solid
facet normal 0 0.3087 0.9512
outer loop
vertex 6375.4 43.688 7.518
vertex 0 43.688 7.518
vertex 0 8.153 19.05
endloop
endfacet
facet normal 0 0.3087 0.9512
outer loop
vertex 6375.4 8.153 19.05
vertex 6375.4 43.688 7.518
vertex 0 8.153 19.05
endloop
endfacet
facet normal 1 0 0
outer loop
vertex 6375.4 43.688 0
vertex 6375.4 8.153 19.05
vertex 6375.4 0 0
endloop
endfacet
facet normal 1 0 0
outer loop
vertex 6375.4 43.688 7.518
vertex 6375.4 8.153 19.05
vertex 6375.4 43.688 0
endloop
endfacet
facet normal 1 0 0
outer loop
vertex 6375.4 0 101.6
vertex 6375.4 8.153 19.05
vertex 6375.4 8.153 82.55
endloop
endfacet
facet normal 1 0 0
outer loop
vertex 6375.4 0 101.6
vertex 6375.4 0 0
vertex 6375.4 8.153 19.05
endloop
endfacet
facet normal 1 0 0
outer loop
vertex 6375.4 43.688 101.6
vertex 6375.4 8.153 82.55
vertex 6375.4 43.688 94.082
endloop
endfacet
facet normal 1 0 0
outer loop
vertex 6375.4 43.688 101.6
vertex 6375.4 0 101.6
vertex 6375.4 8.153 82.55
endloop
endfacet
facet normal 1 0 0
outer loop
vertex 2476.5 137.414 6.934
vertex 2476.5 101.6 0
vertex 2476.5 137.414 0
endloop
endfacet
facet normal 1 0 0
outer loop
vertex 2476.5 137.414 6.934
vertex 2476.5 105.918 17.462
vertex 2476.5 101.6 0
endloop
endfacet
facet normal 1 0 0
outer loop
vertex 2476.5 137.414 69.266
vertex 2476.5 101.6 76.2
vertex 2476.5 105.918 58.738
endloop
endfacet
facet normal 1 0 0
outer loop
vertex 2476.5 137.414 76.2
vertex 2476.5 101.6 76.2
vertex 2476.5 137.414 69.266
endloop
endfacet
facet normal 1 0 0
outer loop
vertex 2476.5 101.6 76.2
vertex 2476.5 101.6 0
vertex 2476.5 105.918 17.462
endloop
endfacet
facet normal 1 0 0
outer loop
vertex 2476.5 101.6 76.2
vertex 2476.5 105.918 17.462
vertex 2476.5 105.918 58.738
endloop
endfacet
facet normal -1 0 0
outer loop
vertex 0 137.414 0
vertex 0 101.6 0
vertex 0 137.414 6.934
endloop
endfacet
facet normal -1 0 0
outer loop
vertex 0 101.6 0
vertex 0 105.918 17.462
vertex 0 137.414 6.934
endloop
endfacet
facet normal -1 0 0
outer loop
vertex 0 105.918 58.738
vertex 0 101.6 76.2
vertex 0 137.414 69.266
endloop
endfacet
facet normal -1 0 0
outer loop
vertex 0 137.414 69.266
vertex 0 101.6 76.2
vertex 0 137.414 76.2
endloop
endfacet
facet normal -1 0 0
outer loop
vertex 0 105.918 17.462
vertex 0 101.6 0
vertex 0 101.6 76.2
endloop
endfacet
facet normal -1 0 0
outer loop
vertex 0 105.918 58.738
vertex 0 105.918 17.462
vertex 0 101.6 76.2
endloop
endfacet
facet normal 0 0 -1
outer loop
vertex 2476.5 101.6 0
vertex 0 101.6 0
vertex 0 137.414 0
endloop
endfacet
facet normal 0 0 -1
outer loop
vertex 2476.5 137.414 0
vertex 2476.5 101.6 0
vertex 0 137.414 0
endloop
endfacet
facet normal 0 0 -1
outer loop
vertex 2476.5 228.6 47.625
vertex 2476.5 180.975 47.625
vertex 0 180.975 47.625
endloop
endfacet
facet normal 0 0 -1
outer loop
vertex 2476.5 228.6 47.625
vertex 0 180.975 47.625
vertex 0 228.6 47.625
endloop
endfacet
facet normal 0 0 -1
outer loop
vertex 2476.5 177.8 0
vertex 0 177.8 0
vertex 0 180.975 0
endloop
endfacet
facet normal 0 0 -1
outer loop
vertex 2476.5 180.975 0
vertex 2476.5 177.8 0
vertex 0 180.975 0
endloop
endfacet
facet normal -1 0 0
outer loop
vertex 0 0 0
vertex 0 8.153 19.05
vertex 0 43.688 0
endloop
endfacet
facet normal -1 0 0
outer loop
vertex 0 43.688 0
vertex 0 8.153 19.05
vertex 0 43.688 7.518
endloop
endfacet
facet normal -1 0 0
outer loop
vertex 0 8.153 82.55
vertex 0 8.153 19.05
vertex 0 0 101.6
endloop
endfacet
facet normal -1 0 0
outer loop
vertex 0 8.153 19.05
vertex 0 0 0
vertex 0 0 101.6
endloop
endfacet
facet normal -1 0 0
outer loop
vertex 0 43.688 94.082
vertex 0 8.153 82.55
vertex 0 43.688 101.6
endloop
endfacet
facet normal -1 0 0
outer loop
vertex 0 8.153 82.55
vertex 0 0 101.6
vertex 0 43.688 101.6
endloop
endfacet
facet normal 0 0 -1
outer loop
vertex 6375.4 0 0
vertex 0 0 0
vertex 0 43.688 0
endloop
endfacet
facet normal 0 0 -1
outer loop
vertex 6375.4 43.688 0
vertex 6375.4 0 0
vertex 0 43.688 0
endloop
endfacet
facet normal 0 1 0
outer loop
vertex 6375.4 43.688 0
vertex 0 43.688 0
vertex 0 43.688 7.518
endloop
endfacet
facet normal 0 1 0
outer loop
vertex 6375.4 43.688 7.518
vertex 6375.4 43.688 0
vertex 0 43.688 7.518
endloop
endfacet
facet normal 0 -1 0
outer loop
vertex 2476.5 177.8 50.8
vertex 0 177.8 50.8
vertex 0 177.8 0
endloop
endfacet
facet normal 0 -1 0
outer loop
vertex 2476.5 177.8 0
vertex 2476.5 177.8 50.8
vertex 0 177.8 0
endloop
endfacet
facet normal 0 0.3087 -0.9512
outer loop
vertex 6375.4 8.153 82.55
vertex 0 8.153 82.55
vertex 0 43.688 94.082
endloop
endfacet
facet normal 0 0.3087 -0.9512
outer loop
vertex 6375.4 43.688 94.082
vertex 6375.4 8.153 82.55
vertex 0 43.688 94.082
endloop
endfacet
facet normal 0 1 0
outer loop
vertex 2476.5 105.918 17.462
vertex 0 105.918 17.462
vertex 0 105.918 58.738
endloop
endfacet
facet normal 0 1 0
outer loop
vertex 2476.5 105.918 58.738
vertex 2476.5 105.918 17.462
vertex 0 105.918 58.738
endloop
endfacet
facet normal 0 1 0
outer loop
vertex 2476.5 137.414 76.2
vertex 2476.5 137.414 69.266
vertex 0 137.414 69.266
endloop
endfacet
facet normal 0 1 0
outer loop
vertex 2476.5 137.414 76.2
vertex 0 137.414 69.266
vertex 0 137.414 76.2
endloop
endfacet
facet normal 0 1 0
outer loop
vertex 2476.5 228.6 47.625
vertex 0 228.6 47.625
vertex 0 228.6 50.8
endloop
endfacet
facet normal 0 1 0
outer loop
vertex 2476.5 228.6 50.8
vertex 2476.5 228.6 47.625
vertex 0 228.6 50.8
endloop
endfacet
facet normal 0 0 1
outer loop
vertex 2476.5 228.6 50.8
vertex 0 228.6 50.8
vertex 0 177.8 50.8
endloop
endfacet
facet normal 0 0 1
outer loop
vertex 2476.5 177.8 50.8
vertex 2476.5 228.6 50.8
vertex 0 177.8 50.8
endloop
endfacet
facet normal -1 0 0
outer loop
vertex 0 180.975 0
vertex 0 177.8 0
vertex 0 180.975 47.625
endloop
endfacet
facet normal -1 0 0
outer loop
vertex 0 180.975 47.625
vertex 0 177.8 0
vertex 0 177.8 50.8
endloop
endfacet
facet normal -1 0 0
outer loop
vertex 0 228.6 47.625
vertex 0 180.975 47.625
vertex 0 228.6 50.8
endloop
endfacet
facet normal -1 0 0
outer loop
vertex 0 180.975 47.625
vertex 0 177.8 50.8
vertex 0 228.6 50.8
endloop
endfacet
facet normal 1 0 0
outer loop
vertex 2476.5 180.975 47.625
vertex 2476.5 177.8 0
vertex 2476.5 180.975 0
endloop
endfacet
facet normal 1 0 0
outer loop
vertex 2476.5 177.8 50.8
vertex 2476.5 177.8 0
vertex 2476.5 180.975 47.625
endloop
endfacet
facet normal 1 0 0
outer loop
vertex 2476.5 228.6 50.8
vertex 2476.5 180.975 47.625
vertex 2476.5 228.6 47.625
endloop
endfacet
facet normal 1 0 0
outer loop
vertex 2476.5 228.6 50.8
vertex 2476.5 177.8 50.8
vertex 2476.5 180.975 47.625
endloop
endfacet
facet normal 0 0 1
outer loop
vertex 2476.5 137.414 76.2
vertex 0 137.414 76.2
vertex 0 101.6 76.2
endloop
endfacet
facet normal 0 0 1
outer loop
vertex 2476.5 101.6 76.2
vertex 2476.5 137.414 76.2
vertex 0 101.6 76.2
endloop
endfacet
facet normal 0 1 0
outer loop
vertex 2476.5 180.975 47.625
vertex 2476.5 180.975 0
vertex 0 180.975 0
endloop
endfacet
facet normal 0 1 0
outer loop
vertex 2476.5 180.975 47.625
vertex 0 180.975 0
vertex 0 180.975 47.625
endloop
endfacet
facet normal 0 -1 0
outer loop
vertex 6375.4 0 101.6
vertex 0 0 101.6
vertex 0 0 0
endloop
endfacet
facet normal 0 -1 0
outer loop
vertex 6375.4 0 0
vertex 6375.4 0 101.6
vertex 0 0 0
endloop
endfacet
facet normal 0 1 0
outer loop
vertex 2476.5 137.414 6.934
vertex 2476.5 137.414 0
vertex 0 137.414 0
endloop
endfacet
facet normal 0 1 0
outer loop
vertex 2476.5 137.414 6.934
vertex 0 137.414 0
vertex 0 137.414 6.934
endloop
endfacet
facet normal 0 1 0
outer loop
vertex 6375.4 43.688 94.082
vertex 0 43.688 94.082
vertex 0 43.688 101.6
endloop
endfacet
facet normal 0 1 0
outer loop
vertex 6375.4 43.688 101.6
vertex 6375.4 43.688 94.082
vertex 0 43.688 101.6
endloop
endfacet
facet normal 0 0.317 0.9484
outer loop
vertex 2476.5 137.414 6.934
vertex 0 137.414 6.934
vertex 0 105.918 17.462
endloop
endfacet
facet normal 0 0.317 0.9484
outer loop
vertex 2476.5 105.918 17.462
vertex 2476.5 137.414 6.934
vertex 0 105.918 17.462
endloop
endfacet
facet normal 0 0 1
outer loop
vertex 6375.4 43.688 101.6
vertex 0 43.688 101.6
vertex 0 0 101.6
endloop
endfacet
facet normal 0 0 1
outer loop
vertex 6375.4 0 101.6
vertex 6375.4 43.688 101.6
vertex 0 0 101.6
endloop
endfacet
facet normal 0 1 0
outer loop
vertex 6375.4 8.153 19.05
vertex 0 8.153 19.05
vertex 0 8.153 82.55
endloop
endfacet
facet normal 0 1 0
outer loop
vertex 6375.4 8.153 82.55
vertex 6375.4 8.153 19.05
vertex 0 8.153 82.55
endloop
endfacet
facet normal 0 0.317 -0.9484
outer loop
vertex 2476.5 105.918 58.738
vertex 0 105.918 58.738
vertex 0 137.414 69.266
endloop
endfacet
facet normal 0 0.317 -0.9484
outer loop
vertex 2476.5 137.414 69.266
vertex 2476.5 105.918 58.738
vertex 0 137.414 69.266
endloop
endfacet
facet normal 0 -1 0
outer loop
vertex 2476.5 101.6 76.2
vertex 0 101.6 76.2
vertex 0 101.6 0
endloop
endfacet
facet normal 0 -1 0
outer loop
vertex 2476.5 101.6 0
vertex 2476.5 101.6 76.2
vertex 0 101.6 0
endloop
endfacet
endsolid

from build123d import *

# Parameters (mm, degrees)
F1_DEPTH = 6375.4
F2_DEPTH = 2476.5
F3_DEPTH = 2476.5


with BuildPart() as f1:
    # F0 (on Right) → F1 (new body)
    with BuildSketch(Plane.YZ):
        Polygon((0, 101.6), (0, 0), (43.688, 0), (43.688, 7.5184), (8.1534, 19.05), (8.1534, 82.55), (43.688, 94.0816), (43.688, 101.6), align=None)
    extrude(amount=F1_DEPTH)


with BuildPart() as f2:
    # F0 (on Right) → F2 (new body)
    with BuildSketch(Plane.YZ):
        Polygon((101.6, 76.2), (101.6, 0), (137.414, 0), (137.414, 6.9342), (105.918, 17.4625), (105.918, 58.7375), (137.414, 69.2658), (137.414, 76.2), align=None)
    extrude(amount=F2_DEPTH)


with BuildPart() as f3:
    # F0 (on Right) → F3 (new body)
    with BuildSketch(Plane.YZ):
        Polygon((177.8, 50.8), (177.8, 0), (180.975, 0), (180.975, 47.625), (228.6, 47.625), (228.6, 50.8), align=None)
    extrude(amount=F3_DEPTH)


solid = Compound([f1.part, f2.part, f3.part])
